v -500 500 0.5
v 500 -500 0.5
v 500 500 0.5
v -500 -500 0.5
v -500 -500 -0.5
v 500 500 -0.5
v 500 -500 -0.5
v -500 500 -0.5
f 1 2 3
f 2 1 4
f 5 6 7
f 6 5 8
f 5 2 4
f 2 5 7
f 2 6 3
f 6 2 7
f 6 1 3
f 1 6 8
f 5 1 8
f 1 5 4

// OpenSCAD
module black_bground(){
    color([0.1, 0.1, 0.1]) cube(center=true, [1000,1000,1]);
}

module ed_banger_scene(t){
    T1=1.0; //aproximacao lenta
    TR=0.7;
    function logo_zoom(t) = t < (T1) ? (1-t/(T1))*1000 : 0;
    function logo_opacity(t) = t < TR ? 1 : 1-((t-TR)/(1-TR));
    rotate(logo_rotation(t))
    translate([0,0,logo_zoom(t)]){
        color([0.8, 0.7, 0, logo_opacity(t)])
        linear_extrude(height=20)
        import("Ed Banger records.dxf", layer="Ed");

        color([0.8, 0.2, 0, logo_opacity(t)])
        linear_extrude(height=20)
        import("Ed Banger records.dxf", layer="records");
    }
}


module justice_scene(t){
    T1=1.0; //aproximacao lenta
    TR=0.7;
    function logo_zoom(t) = t < (T1) ? (1-t/(T1))*1000 : 0;
    function logo_opacity(t) = t < TR ? 1 : 1-((t-TR)/(1-TR));
    color([0.8, 0.7, 0.3, logo_opacity(t)])
    rotate(logo_rotation(t))
    translate([0,0,logo_zoom(t)])
        linear_extrude(height=5)
        import("Justice.dxf");
}

module DVNO_intro_logo_scene(t){
    T1=1.0; //aproximacao lenta
    TR=0.7;
    seed = 0;
    x=rands(-300,300,29,seed);
    y=rands(-300,300,29,seed);
    function layer_zoom(part, t) = t < T1 ? (1-t/T1)*1000 : 0;
    function logo_opacity(t) = t < TR ? 1 : 1-((t-TR)/(1-TR));
    color([0.3, 0.2, 1, logo_opacity(t)])
    for(part=[1:29])
    translate([0,0, 40+layer_zoom(part, t)])
        rotate([(0.7-t)*x[part],(0.7-t)*y[part]])
        linear_extrude(height=6)
        import("DVNO_intro_logo.dxf", layer=str("part-",part));
}

module gold_logo(t, layer){
    T1=0.05; //aproximacao rapida
    TR=0.7;
    function layer_zoom(layer, t) = t < (layer*T1) ? (1-t/(layer*T1))*1000 : 0;
    function logo_rotation(t) = t < TR ? 0: (1-t/TR)*(1-t/TR) * 6000;
    function logo_opacity(t) = t < TR ? 1 : 1-((t-TR)/(1-TR));
    color([0.8, 0.8, 0, logo_opacity(t)])
    rotate(logo_rotation(t))
    translate([0,0,layer_zoom(layer, t)])
        linear_extrude(height=20)
        import("Printed in gold.dxf", layer=str("layer-",layer));
}

module printed_in_gold(t){
    T1=0.10; //aproximacao rapida
    T2=0.50; //fadeout lento
    function text_zoom(t) = t < T1 ? (1-t/T1)*200 : 0;
    function text_opacity(t) = t < T2 ? 1 : 1-((t-T2)/(1-T2));
    color([0.8, 0.8, 0, text_opacity(t)])
    translate([0,0,text_zoom(t)])
    render()
    intersection(){
        linear_extrude(height=10)
        import("Printed in gold.dxf", layer="text");
    
        scale([1, 1, 0.5])
        translate([0,-74])
        rotate([0,90])
        cylinder(r=12, h=200, center=true);
    }
}

module printed_in_gold_scene(t){
    for (i=[1:6])
        gold_logo(t, layer=i);
    printed_in_gold(t);
}



black_bground();
TOTAL = 15;
time = $t*TOTAL;

function within_range(t, start, end) = t > start && t < end;
function time_range(t, start, end) = (t-start)/(end-start);

if(within_range(time, 0, 3))
    ed_banger_scene(time_range(time, 0, 3));

if(within_range(time, 3, 5))
    justice_scene(time_range(time, 3, 5));

if(within_range(time, 5, 10))
    DVNO_intro_logo_scene(time_range(time, 5, 10));

if(within_range(time, 10, 15))
    printed_in_gold_scene(time_range(time, 10, 15));
